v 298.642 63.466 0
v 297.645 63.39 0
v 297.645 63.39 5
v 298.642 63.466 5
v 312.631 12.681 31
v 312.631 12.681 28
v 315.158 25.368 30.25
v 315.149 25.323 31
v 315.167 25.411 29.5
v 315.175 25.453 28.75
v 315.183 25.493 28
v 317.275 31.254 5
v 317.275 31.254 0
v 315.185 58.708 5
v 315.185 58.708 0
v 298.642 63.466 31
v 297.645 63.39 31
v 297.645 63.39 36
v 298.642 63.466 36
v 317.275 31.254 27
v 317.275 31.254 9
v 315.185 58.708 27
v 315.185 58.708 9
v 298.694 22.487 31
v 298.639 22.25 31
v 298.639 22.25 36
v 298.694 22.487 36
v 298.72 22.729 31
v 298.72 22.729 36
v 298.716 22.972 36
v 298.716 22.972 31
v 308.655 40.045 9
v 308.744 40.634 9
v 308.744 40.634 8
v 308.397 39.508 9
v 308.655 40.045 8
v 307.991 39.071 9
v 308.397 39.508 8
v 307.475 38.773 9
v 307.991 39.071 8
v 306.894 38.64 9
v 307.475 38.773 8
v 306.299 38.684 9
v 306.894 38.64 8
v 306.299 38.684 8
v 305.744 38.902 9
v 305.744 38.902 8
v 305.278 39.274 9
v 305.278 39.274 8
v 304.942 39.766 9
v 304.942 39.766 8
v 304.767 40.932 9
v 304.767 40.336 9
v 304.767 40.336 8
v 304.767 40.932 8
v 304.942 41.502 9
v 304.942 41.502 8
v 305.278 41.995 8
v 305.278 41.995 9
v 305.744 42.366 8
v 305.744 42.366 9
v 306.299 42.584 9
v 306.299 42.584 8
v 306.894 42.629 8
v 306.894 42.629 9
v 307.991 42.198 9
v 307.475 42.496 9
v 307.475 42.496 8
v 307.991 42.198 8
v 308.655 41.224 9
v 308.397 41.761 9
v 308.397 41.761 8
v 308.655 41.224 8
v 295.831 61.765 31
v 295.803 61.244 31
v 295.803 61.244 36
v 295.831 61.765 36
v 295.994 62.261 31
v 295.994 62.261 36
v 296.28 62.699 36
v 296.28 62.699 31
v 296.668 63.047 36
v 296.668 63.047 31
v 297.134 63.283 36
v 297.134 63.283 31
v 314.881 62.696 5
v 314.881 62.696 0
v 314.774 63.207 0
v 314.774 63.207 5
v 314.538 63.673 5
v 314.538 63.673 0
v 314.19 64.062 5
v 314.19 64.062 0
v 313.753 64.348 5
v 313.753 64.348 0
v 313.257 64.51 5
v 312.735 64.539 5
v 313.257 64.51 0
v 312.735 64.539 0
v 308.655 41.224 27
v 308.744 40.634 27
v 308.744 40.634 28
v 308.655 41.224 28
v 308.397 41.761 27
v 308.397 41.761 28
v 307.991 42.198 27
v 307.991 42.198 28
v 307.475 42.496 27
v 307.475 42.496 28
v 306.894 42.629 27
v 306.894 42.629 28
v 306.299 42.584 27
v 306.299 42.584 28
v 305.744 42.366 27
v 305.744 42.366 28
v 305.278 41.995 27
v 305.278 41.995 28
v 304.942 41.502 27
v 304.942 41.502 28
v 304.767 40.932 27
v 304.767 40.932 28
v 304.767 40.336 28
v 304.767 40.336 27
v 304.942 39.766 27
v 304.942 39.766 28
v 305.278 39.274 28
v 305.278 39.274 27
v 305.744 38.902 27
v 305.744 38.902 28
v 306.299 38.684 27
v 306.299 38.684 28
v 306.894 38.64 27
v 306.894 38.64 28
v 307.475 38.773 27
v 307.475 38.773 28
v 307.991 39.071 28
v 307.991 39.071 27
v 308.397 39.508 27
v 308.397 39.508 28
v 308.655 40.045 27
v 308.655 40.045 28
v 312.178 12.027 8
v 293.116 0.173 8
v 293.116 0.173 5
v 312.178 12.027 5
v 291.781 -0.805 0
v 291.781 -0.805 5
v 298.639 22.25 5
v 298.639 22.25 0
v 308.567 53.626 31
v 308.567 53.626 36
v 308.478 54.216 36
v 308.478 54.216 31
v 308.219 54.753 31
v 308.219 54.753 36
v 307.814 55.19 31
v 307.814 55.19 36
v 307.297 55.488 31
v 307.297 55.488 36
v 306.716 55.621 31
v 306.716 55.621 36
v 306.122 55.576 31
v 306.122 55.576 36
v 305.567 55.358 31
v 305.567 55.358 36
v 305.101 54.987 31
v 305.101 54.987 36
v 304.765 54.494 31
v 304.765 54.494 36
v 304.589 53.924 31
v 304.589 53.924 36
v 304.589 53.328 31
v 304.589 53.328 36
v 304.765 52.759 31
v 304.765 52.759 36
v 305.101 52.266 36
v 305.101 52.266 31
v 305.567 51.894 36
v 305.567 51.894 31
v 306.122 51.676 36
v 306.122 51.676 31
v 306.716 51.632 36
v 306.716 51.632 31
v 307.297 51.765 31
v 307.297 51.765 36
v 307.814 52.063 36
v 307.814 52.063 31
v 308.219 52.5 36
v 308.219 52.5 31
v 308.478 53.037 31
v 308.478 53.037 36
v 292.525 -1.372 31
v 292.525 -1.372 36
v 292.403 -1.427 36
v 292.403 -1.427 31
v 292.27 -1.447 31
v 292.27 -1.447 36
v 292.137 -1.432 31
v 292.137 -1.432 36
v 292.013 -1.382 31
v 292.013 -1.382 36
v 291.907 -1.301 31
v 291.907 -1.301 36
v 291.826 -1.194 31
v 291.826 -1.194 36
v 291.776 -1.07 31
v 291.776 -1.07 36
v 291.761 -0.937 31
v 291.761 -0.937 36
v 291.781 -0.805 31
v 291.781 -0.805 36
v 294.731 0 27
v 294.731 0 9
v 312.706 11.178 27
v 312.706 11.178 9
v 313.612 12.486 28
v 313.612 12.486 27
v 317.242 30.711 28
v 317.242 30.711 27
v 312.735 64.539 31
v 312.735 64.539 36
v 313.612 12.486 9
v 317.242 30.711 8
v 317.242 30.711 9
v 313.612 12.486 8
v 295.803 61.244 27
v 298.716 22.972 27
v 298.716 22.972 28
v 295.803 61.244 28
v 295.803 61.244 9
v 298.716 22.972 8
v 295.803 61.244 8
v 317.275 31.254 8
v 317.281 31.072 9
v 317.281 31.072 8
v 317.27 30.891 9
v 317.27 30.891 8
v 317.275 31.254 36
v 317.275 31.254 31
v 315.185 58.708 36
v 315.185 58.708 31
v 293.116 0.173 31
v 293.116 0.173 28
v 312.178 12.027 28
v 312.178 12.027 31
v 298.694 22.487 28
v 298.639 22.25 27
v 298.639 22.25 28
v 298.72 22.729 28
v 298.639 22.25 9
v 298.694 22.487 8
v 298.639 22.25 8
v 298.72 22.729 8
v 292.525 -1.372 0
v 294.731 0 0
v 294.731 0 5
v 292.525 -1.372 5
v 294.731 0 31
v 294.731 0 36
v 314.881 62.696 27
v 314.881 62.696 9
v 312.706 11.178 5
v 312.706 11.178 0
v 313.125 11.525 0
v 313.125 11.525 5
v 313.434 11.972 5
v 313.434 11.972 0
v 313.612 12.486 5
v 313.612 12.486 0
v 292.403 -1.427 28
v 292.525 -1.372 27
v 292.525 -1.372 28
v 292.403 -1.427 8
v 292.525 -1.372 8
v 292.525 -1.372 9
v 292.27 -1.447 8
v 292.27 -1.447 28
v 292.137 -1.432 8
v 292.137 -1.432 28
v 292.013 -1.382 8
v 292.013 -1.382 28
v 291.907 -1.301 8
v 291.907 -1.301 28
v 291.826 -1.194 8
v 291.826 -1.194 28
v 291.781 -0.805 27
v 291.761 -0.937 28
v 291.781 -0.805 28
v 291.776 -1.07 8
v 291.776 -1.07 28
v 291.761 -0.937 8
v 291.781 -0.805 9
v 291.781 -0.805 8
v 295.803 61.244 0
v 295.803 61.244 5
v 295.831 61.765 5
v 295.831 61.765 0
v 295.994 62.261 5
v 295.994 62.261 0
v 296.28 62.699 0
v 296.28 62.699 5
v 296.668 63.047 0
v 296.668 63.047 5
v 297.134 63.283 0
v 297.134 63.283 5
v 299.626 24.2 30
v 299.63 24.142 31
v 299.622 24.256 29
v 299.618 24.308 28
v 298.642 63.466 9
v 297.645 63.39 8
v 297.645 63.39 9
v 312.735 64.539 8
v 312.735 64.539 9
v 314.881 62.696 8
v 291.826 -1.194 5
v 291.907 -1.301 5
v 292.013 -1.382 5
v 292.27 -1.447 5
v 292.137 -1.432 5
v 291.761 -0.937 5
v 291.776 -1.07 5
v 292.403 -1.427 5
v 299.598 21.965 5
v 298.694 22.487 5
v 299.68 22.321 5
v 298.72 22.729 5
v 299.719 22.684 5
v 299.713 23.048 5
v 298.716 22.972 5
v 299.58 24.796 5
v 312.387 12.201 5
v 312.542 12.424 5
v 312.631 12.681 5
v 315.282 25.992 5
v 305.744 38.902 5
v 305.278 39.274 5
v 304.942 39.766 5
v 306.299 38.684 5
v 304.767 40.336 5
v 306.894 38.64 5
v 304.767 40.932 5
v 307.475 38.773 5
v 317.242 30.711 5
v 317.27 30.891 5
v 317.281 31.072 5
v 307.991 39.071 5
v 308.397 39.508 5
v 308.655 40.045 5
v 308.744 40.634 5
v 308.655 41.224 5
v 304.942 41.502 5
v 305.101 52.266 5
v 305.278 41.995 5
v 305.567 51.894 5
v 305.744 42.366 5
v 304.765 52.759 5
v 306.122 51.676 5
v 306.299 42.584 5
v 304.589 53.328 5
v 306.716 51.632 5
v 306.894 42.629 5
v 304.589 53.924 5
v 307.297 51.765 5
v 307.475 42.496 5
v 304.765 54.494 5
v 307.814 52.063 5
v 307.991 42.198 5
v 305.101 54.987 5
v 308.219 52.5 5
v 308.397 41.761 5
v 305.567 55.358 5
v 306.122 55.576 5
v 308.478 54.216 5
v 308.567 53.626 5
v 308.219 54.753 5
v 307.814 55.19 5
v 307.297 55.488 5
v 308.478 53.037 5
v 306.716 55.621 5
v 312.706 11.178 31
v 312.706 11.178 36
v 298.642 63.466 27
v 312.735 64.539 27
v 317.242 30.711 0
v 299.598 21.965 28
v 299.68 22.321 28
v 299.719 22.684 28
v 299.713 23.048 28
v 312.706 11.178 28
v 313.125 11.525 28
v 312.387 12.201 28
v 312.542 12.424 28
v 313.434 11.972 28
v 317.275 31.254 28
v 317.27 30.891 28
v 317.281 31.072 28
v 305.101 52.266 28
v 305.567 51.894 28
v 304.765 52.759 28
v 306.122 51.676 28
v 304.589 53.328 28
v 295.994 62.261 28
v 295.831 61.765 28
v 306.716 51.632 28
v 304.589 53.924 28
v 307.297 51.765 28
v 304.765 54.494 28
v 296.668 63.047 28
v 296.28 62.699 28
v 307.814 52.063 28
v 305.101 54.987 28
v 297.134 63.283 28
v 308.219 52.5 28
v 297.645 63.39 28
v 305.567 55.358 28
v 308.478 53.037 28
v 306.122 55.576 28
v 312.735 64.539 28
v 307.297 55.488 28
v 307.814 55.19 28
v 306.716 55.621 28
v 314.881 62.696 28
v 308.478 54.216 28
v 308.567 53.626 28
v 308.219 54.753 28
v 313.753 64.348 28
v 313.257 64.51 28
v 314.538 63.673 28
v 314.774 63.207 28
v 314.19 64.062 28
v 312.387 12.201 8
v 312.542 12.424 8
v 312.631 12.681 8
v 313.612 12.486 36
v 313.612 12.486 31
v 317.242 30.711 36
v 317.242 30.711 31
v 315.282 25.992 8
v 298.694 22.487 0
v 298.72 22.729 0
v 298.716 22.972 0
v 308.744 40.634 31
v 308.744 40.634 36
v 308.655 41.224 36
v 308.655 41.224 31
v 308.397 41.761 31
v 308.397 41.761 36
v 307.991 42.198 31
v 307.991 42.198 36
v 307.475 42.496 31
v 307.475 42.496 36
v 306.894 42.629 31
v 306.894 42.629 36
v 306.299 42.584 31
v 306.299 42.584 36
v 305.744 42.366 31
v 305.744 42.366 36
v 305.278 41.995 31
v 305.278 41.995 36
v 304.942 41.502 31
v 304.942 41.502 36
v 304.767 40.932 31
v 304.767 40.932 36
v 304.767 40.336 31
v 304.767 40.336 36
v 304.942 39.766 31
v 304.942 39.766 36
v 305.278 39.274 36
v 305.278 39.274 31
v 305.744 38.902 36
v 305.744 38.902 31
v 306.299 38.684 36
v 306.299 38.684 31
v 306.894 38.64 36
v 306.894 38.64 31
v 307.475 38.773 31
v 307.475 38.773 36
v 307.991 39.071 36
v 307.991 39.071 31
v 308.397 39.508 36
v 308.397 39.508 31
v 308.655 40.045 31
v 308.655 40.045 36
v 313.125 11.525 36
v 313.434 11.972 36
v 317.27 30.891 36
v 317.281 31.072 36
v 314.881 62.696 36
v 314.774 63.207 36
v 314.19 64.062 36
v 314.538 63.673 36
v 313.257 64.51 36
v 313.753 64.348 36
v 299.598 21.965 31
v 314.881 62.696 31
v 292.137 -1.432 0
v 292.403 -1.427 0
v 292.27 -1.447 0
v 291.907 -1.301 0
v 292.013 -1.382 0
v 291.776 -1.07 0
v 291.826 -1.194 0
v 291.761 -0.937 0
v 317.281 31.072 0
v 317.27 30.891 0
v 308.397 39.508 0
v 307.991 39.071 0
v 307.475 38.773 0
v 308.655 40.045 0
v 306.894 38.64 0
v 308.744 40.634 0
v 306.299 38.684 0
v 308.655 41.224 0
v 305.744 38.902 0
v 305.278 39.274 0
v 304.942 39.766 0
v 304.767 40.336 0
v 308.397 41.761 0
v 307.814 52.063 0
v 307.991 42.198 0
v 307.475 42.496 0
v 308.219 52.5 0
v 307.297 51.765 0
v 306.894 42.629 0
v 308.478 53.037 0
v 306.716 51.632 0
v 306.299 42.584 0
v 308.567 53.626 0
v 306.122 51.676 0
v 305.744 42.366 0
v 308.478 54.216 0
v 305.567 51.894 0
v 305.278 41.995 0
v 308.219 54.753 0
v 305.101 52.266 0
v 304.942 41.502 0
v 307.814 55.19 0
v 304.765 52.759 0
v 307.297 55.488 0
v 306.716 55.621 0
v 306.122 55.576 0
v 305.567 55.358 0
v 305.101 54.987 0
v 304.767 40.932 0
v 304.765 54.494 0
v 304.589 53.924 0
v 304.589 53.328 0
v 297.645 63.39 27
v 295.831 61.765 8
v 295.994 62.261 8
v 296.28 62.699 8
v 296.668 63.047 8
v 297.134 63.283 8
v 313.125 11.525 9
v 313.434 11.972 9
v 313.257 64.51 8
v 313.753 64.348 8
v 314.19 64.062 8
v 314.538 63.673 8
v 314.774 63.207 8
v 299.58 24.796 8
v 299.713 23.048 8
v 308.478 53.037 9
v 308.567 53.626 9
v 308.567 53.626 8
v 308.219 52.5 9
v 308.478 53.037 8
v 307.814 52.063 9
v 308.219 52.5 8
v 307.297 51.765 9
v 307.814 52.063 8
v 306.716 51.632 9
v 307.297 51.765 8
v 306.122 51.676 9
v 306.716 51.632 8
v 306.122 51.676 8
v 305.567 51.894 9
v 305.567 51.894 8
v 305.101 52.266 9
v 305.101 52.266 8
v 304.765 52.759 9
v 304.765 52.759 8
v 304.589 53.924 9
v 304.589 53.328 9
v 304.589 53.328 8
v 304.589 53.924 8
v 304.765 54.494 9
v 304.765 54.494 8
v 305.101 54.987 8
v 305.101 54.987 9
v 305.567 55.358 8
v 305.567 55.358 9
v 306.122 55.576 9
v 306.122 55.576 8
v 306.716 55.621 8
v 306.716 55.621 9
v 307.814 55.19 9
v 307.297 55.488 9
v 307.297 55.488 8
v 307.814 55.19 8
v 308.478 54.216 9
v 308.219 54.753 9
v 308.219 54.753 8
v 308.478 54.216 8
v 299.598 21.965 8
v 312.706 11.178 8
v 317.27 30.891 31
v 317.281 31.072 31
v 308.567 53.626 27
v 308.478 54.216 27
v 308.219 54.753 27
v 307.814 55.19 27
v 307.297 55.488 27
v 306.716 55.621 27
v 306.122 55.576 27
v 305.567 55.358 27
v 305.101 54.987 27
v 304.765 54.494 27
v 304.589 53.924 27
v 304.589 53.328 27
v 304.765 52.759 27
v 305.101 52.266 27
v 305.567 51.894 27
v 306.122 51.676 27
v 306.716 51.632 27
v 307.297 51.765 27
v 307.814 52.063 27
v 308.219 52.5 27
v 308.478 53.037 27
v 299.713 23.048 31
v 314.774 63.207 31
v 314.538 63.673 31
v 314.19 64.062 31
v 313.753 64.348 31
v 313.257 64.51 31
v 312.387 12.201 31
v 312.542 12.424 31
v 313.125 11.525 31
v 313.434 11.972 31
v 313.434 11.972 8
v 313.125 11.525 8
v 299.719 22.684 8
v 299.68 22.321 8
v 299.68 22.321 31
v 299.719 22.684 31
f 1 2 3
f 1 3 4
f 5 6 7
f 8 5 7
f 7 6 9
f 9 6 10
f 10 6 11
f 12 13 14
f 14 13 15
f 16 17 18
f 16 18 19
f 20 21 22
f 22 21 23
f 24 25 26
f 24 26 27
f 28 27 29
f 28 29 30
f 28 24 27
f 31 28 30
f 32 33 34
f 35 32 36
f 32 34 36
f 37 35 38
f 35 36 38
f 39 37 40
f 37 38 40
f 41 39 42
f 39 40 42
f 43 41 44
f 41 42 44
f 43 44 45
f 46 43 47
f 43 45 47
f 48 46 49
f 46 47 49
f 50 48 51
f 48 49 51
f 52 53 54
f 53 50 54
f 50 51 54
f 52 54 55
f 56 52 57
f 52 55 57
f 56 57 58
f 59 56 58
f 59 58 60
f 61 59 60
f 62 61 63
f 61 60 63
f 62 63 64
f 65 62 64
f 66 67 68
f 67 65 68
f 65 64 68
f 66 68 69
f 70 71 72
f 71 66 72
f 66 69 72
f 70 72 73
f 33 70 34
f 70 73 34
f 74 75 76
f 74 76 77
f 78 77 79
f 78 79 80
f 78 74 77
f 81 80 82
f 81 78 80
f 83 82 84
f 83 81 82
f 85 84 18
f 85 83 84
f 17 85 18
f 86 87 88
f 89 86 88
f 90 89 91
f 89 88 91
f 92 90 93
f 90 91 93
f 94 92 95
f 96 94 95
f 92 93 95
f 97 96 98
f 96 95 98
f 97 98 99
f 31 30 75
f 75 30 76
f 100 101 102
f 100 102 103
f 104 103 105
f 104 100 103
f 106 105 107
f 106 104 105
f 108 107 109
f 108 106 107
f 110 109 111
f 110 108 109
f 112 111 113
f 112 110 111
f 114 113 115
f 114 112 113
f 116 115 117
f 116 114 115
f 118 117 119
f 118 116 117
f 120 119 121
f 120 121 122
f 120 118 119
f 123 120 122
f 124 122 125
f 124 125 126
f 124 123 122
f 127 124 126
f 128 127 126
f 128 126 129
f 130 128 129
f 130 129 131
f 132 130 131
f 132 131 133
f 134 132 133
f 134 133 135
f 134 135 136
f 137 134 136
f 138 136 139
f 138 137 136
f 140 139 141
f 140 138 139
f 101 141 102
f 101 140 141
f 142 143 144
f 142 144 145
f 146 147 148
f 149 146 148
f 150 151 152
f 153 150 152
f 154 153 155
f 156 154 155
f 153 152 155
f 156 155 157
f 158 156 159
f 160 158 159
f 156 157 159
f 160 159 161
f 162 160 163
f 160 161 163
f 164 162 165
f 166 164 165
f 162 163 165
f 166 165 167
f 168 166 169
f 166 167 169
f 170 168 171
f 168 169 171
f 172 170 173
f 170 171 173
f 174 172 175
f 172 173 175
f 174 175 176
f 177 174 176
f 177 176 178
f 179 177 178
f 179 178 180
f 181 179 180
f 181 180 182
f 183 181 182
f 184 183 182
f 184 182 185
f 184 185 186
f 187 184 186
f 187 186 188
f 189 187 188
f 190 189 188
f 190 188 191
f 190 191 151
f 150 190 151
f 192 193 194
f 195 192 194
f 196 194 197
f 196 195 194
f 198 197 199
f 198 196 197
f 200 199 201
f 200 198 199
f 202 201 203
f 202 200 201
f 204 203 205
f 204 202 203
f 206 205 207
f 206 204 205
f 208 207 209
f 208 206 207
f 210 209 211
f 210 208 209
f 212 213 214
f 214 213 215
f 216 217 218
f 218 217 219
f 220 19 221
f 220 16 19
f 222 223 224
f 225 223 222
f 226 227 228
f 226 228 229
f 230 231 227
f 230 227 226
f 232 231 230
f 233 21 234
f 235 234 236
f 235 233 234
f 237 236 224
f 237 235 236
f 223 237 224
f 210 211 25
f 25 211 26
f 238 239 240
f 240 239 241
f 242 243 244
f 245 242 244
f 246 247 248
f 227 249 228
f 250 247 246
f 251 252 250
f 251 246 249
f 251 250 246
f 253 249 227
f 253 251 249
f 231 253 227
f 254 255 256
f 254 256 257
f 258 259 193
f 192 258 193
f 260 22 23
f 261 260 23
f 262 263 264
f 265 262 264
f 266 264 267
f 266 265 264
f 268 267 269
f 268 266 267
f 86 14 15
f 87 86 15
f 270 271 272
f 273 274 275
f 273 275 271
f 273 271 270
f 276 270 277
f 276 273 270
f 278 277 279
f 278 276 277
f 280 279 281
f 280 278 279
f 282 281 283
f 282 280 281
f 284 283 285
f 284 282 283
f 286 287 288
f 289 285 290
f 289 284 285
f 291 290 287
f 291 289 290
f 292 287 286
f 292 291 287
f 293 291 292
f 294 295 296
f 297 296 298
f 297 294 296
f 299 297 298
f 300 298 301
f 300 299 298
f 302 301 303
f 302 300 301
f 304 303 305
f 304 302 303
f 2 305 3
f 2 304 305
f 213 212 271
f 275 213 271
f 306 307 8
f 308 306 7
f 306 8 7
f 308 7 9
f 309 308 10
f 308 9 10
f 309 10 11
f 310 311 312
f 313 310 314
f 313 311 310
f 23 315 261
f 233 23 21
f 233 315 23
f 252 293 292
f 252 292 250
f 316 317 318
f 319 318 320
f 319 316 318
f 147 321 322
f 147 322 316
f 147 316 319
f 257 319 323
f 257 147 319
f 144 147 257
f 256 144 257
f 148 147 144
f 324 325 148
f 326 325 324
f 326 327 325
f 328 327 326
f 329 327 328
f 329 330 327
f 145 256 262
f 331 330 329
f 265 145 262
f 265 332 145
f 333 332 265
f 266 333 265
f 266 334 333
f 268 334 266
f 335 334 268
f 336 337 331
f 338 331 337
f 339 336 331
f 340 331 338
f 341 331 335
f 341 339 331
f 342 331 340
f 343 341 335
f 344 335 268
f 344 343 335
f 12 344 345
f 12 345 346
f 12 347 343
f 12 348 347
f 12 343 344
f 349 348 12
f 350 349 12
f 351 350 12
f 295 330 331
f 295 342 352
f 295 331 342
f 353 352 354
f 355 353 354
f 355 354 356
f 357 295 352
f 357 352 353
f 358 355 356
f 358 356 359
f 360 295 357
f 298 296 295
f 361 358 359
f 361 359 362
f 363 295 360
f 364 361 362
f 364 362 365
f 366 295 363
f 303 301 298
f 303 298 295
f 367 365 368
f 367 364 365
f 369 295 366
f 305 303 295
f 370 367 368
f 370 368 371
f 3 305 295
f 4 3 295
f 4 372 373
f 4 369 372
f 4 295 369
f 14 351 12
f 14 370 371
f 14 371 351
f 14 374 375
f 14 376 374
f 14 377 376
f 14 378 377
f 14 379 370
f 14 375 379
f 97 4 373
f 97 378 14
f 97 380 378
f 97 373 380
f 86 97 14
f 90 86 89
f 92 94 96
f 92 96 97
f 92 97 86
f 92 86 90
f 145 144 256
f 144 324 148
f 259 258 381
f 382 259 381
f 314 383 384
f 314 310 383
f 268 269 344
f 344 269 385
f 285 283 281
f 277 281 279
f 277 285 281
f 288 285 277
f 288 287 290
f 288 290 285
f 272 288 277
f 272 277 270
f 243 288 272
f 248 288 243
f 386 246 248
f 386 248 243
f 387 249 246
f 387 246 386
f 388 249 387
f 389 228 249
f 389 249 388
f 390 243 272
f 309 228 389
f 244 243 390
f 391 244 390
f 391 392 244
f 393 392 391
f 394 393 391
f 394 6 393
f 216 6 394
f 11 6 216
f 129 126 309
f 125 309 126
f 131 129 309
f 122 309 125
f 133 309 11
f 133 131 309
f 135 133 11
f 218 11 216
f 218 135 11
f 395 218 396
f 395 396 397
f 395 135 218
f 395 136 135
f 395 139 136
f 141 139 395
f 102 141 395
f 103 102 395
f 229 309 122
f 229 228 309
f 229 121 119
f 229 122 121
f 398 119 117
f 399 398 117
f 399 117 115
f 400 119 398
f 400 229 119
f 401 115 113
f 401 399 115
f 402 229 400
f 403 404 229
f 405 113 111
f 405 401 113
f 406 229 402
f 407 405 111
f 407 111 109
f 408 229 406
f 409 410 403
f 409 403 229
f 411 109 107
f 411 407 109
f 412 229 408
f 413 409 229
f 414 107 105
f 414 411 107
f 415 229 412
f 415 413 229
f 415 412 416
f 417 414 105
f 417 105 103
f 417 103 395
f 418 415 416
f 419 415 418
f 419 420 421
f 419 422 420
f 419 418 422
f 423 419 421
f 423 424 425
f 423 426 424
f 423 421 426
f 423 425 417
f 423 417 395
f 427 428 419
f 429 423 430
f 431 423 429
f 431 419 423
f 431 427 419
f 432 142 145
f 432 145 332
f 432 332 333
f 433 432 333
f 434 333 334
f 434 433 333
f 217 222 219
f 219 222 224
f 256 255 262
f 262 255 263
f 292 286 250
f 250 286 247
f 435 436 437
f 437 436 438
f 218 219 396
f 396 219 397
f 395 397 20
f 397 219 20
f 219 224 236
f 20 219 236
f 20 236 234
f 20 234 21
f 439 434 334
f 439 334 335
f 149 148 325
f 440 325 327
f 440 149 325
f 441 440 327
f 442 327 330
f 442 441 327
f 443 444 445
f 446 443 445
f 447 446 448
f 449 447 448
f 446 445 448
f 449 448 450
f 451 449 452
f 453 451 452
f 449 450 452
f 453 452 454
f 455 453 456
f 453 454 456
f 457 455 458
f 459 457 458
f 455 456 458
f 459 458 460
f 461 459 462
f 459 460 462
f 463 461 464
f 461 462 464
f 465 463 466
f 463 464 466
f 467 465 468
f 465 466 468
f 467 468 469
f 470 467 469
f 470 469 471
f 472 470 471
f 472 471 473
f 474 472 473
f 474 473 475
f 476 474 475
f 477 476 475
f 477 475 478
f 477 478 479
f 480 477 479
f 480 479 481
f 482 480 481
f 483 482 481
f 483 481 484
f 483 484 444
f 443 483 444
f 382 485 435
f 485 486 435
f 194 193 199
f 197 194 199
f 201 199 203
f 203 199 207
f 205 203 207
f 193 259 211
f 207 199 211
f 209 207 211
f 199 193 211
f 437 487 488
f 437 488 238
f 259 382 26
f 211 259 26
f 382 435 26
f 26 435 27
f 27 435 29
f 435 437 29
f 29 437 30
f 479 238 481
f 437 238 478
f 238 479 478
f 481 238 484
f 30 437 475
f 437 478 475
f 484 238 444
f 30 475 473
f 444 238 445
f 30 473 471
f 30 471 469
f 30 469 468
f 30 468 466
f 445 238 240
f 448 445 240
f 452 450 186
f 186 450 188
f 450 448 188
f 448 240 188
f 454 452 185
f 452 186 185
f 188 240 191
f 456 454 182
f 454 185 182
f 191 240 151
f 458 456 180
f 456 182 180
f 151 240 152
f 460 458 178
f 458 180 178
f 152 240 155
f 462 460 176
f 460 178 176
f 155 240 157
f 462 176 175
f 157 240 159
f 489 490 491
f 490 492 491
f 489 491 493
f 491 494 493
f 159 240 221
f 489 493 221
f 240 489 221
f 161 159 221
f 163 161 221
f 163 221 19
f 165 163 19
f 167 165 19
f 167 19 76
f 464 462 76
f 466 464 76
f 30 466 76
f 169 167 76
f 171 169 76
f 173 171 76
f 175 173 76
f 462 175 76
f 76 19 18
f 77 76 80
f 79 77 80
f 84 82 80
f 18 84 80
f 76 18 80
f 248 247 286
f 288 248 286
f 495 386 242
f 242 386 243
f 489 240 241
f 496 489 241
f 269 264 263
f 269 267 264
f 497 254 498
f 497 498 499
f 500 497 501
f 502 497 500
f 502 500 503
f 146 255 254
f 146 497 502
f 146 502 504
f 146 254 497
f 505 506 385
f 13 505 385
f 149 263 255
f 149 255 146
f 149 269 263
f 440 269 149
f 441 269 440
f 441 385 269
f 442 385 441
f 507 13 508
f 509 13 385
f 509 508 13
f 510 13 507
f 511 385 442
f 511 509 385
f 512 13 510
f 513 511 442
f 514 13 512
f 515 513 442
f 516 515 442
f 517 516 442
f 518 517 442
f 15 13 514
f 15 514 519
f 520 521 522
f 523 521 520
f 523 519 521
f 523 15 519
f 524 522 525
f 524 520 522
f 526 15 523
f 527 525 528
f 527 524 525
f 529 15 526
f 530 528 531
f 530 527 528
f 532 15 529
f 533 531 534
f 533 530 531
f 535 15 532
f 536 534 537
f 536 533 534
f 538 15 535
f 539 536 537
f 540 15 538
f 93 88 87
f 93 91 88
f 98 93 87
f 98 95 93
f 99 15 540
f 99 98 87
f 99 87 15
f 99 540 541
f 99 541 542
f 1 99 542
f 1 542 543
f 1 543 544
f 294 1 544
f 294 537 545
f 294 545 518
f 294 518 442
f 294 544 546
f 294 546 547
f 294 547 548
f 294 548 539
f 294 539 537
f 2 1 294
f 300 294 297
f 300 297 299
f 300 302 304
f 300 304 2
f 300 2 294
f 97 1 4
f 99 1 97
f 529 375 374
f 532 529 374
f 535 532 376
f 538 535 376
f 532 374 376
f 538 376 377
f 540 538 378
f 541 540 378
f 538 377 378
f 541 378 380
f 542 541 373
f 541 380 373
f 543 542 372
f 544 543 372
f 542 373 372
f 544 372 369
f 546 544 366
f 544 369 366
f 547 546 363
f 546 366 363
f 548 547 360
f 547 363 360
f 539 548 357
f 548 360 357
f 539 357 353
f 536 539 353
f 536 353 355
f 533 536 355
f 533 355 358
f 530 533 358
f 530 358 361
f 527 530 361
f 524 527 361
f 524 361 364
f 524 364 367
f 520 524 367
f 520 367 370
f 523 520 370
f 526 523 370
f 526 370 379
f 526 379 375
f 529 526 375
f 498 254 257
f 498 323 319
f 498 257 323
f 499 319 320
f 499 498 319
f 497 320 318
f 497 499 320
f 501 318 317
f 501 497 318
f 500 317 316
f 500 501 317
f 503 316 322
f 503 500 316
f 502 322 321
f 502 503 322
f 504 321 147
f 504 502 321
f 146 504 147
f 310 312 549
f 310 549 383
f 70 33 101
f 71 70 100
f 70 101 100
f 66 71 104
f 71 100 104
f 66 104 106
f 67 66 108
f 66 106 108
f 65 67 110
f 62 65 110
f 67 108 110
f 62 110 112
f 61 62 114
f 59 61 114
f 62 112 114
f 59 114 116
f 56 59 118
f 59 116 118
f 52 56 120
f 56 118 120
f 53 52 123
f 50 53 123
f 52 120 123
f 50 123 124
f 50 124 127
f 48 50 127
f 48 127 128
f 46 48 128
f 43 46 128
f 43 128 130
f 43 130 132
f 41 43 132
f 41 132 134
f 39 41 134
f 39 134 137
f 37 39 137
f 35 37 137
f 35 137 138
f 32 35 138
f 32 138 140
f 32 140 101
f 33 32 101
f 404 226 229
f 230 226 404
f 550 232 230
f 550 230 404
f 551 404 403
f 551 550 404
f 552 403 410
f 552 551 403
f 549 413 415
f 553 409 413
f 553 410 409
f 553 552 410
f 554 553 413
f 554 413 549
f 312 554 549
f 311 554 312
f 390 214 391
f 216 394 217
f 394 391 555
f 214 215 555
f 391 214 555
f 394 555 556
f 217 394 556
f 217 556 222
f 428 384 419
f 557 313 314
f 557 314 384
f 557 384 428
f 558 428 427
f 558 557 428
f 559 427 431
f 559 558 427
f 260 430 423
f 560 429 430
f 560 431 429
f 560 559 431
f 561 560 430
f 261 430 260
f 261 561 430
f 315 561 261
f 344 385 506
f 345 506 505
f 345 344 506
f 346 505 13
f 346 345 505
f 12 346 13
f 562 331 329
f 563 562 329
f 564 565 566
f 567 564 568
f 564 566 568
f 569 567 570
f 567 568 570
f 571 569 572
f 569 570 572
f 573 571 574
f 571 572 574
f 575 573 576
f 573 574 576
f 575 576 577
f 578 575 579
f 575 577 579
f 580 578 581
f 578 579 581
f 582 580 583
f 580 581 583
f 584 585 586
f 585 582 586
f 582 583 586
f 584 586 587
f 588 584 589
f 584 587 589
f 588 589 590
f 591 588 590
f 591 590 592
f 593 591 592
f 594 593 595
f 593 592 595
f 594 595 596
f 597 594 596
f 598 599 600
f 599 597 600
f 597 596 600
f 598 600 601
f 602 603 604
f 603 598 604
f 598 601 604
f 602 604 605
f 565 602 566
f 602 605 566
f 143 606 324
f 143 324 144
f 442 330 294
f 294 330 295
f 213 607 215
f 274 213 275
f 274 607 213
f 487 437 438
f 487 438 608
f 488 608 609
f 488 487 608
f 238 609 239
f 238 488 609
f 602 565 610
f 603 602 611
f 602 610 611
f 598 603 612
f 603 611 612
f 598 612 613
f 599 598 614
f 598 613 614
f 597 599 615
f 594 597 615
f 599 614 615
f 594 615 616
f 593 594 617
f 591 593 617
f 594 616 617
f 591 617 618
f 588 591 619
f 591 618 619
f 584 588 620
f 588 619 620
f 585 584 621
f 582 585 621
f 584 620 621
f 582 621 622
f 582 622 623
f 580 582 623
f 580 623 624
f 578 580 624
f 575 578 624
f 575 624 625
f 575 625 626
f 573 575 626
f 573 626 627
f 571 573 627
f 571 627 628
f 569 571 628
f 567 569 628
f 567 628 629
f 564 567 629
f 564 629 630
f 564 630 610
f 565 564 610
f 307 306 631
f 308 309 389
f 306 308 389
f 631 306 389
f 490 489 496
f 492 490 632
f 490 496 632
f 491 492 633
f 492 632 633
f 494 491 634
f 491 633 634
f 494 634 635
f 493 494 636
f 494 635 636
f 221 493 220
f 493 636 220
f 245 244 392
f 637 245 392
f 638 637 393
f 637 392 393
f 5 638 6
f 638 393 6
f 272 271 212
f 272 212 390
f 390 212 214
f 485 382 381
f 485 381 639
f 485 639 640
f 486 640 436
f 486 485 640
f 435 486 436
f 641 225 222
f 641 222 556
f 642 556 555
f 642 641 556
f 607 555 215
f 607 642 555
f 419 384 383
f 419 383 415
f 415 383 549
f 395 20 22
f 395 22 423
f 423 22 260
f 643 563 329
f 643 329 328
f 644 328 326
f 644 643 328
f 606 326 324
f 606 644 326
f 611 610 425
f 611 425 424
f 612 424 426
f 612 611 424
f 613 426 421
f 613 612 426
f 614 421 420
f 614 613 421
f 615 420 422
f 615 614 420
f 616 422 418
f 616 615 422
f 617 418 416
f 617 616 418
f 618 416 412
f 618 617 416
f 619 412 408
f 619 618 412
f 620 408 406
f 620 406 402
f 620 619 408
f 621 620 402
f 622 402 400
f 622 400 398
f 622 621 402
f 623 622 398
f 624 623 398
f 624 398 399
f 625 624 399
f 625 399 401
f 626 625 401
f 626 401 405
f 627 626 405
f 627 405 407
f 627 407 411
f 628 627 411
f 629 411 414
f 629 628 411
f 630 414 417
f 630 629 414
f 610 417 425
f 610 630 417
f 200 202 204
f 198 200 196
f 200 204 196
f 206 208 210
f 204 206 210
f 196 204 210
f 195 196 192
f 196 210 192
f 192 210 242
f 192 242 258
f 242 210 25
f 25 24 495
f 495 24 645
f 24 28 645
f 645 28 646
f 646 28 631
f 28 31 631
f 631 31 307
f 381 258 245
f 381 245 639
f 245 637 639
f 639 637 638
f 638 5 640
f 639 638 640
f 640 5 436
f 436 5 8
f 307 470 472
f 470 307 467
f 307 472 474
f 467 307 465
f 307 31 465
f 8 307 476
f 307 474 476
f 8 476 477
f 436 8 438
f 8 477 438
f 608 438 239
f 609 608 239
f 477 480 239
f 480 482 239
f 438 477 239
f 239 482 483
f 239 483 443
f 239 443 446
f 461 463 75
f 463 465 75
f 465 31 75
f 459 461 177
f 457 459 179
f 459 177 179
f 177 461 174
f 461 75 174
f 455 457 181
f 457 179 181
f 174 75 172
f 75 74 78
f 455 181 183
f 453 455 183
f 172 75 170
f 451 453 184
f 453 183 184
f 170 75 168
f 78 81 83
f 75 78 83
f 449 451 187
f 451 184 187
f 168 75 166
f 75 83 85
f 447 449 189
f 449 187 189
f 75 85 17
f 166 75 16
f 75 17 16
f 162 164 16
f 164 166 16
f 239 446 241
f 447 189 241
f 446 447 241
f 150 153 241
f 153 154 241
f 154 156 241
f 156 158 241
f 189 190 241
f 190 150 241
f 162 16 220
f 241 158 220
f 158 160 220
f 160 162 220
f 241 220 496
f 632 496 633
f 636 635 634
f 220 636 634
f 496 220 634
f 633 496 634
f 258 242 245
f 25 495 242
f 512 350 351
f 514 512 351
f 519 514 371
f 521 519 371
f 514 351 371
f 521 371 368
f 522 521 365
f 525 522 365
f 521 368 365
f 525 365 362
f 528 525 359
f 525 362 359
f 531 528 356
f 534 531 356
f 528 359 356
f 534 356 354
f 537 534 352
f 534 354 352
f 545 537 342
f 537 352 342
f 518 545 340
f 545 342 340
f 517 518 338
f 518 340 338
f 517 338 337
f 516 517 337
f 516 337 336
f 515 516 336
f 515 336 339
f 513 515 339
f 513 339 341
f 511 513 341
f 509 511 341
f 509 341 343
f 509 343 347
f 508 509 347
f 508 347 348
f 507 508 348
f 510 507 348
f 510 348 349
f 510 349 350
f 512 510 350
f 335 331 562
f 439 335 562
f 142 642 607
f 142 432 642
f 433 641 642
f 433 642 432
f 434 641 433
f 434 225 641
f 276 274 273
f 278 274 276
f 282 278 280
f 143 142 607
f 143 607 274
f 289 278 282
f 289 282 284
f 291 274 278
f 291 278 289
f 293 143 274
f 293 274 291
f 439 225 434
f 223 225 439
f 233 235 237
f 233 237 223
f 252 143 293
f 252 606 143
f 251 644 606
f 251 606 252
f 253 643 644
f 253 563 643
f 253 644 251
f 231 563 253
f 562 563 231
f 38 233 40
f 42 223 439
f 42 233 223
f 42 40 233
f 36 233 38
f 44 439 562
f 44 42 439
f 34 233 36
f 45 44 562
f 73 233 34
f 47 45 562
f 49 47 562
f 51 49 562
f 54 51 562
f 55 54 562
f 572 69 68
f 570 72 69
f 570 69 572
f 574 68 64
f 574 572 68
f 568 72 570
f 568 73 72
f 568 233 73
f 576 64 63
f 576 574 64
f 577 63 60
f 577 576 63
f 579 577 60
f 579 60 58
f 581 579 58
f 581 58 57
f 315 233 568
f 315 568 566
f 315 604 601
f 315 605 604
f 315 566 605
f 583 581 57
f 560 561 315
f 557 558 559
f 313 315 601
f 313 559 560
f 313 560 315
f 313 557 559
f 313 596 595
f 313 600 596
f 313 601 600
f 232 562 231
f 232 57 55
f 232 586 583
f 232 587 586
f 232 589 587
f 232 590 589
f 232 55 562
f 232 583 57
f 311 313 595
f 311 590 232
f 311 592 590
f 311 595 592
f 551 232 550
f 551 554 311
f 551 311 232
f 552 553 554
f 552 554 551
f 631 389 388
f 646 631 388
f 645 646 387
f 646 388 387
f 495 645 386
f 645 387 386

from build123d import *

# Parameters (mm, degrees)
EXTRUDE_1_DEPTH     = 36
SKETCH_2_W          = 16.133790568
SKETCH_2_H          = 36
EXTRUDE_2_DEPTH     = 6
EXTRUDE_3_DEPTH     = 36
FILLET_2_R          = 0.5
FILLET_4_R          = 2
CUT_EXTRUDE_START   = -4
CUT_EXTRUDE_1_DEPTH = 4
CUT_EXTRUDE_2_DEPTH = 60.648936936
CUT_EXTRUDE_4_DEPTH = 60.648936936
SKETCH_10_R         = 2
CUT_EXTRUDE_5_DEPTH = 292.913162357
SKETCH_11_R         = 2
EXTRUDE_6_DEPTH     = 1
EXTRUDE_START       = 1
SKETCH_12_R         = 2
EXTRUDE_7_DEPTH     = 1


with BuildPart() as part:
    # 草图1 → 凸台-拉伸1 (new body)
    with BuildSketch(Plane.XY):
        Polygon((299.097748252, 57.483280844), (301.735697168, 22.832042919), (294.730758259, 0), (313.442305989, 11.635922746), (317.295860503, 30.980257384), (315.184988901, 58.707979342), align=None)
    extrude(amount=EXTRUDE_1_DEPTH)

    # 草图2 → 凸台-拉伸2 (add)
    with BuildSketch(Plane(origin=(-2.627453617, 34.513375093, 0), x_dir=(0.9971147561793038, 0.07590891258269725, 0), z_dir=(-0.07590891258269725, 0.9971147561793038, 0))):
        with Locations((310.665166947, -18)):
            Rectangle(SKETCH_2_W, SKETCH_2_H)
    extrude(amount=EXTRUDE_2_DEPTH)

    # 草图3 → 凸台-拉伸3 (add)
    with BuildSketch(Plane.XY.offset(36)):
        Polygon((298.642294776, 63.465969381), (301.735697168, 22.832042919), (294.730758259, 0), (291.40566003, -2.067738419), (298.7443529, 22.604316182), (295.650950508, 63.238242643), align=None)
    extrude(amount=-EXTRUDE_3_DEPTH)

    # 圆角2
    fillet_2_edges = [part.edges().sort_by_distance(p)[0] for p in [
        (291.40566003, -2.067738419, 18),
    ]]
    fillet(fillet_2_edges, radius=FILLET_2_R)

    # 圆角4
    fillet_4_edges = [part.edges().sort_by_distance(p)[0] for p in [
        (317.295860503, 30.980257384, 18),
        (313.442305989, 11.635922746, 18),
        (314.729535426, 64.690667879, 18),
        (298.7443529, 22.604316182, 18),
        (295.650950508, 63.238242643, 18),
    ]]
    fillet(fillet_4_edges, radius=FILLET_4_R)

    # 草图4 → 切除-拉伸1 (cut)
    with BuildSketch(Plane.XY.offset(31).offset(CUT_EXTRUDE_START)):
        with BuildLine():
            Line((292.524622126, -1.371903061), (312.706326829, 11.178248331))
            ThreePointArc((312.706326829, 11.178248331), (313.294550919, 11.738215234), (313.61162859, 12.485899834))
            Line((313.61162859, 12.485899834), (317.242267225, 30.711226207))
            ThreePointArc((317.242267225, 30.711226207), (317.277169716, 30.981386297), (317.27503737, 31.253783271))
            Line((317.27503737, 31.253783271), (314.881353251, 62.696438367))
            ThreePointArc((314.881353251, 62.696438367), (314.189905536, 64.062105166), (312.735305913, 64.538850054))
            Line((312.735305913, 64.538850054), (297.64518002, 63.390060468))
            ThreePointArc((297.64518002, 63.390060468), (296.27951322, 62.698612754), (295.802768333, 61.244013131))
            Line((295.802768333, 61.244013131), (298.716326749, 22.972458573))
            ThreePointArc((298.716326749, 22.972458573), (298.710751525, 22.607910585), (298.639090177, 22.250431957))
            Line((298.639090177, 22.250431957), (291.781334489, -0.804753178))
            ThreePointArc((291.781334489, -0.804753178), (291.957278491, -1.344805743), (292.524622126, -1.371903061))
        make_face()
        with BuildLine():
            Line((312.811214826, 63.541735298), (297.721088933, 62.392945712))
            ThreePointArc((297.721088933, 62.392945712), (297.038255533, 62.047221855), (296.799883089, 61.319922043))
            Line((296.799883089, 61.319922043), (299.713441505, 23.048367486))
            ThreePointArc((299.713441505, 23.048367486), (299.705078669, 22.501545504), (299.597586647, 21.965327561))
            Line((299.597586647, 21.965327561), (293.115505419, 0.173127667))
            Line((293.115505419, 0.173127667), (312.178248026, 12.027443702))
            ThreePointArc((312.178248026, 12.027443702), (312.472360071, 12.307427153), (312.630898906, 12.681269453))
            Line((312.630898906, 12.681269453), (316.261537541, 30.906595826))
            ThreePointArc((316.261537541, 30.906595826), (316.278988787, 31.041675872), (316.277922614, 31.177874358))
            Line((316.277922614, 31.177874358), (313.884238495, 62.620529454))
            ThreePointArc((313.884238495, 62.620529454), (313.538514637, 63.303362854), (312.811214826, 63.541735298))
        make_face(mode=Mode.SUBTRACT)
    cut_extrude_1 = extrude(amount=CUT_EXTRUDE_1_DEPTH, mode=Mode.SUBTRACT)

    # 镜向1: 切除-拉伸1 across plane
    add(cut_extrude_1.mirror(Plane.XY.offset(18)), mode=Mode.SUBTRACT)

    # 草图5 → 切除-拉伸2 (cut, through all)
    with BuildSketch(Plane(origin=(316.815327762, 24.118695337, 0), x_dir=(0, 0, -1), z_dir=(0.9971147561793037, 0.07590891258269838, 0))):
        Polygon((-9, 29.005921915), (-5, 29.005921915), (-5, 7.07960541), (-5, 1.984059182), (-9, 1.984059182), (-9, 7.07960541), align=None)
        with BuildLine():
            Line((-31, 29.005921915), (-31, 7.07960541))
            Line((-31, 7.07960541), (-31, 1.327664424))
            ThreePointArc((-31, 1.327664424), (-29.000294628, 1.441652043), (-27, 1.544783774))
            Line((-27, 1.544783774), (-27, 7.07960541))
            Line((-27, 7.07960541), (-27, 29.005921915))
            Line((-27, 29.005921915), (-31, 29.005921915))
        make_face()
    extrude(amount=-CUT_EXTRUDE_2_DEPTH, mode=Mode.SUBTRACT)

    # 草图9 → 切除-拉伸4 (cut, through all)
    with BuildSketch(Plane(origin=(316.815327762, 24.118695337, 0), x_dir=(0, 0, -1), z_dir=(0.9971147561793037, 0.07590891258269838, 0))):
        Polygon((-9, 38.613242737), (-9, 41.460309821), (-5, 41.460309821), (-5, 38.613242737), (-5, 29.005921915), (-9, 29.005921915), align=None)
        Polygon((-31, 38.613242737), (-31, 44.422842446), (-27, 44.422842446), (-27, 38.613242737), (-27, 29.005921915), (-31, 29.005921915), align=None)
    extrude(amount=-CUT_EXTRUDE_4_DEPTH, mode=Mode.SUBTRACT)

    # 草图10 → 切除-拉伸5 (cut, through all)
    with BuildSketch(Plane(origin=(66.866773871, -81.092277049, 36), x_dir=(0.7883945685937017, 0.6151698986556081, 0), z_dir=(0, 0, 1))):
        with Locations(Location((264.00053068, -51.596816089, 0), (0, 0, 322.035733535))):
            Circle(SKETCH_10_R)
        with Locations(Location((271.852922924, -41.244744086, 0), (0, 0, 322.035733535))):
            Circle(SKETCH_10_R)
    extrude(amount=-CUT_EXTRUDE_5_DEPTH, mode=Mode.SUBTRACT)

    # 草图11 → 凸台-拉伸6 (add)
    with BuildSketch(Plane.XY.offset(27)):
        with BuildLine():
            Line((312.735305913, 64.538850054), (297.64518002, 63.390060468))
            ThreePointArc((297.64518002, 63.390060468), (296.27951322, 62.698612754), (295.802768333, 61.244013131))
            Line((295.802768333, 61.244013131), (298.716326749, 22.972458573))
            ThreePointArc((298.716326749, 22.972458573), (298.710751525, 22.607910585), (298.639090177, 22.250431957))
            Line((298.639090177, 22.250431957), (291.781334489, -0.804753178))
            ThreePointArc((291.781334489, -0.804753178), (291.957278491, -1.344805743), (292.524622126, -1.371903061))
            Line((292.524622126, -1.371903061), (312.706326829, 11.178248331))
            ThreePointArc((312.706326829, 11.178248331), (313.294550919, 11.738215234), (313.61162859, 12.485899834))
            Line((313.61162859, 12.485899834), (317.242267225, 30.711226207))
            ThreePointArc((317.242267225, 30.711226207), (317.277169716, 30.981386297), (317.27503737, 31.253783271))
            Line((317.27503737, 31.253783271), (314.881353251, 62.696438367))
            ThreePointArc((314.881353251, 62.696438367), (314.189905536, 64.062105166), (312.735305913, 64.538850054))
        make_face()
        with Locations((306.74416649, 40.634253093)):
            Circle(SKETCH_11_R, mode=Mode.SUBTRACT)
        with Locations((306.5666668, 53.626325775)):
            Circle(SKETCH_11_R, mode=Mode.SUBTRACT)
    extrude(amount=EXTRUDE_6_DEPTH)

    # 草图12 → 凸台-拉伸7 (add)
    with BuildSketch(Plane(origin=(0, 0, 9), x_dir=(-1, 0, 0), z_dir=(0, 0, -1)).offset(EXTRUDE_START)):
        with BuildLine():
            Line((-298.716326749, 22.972458573), (-295.802768333, 61.244013131))
            ThreePointArc((-295.802768333, 61.244013131), (-296.27951322, 62.698612754), (-297.64518002, 63.390060468))
            Line((-297.64518002, 63.390060468), (-312.735305913, 64.538850054))
            ThreePointArc((-312.735305913, 64.538850054), (-314.189905536, 64.062105166), (-314.881353251, 62.696438367))
            Line((-314.881353251, 62.696438367), (-317.27503737, 31.253783271))
            ThreePointArc((-317.27503737, 31.253783271), (-317.277169716, 30.981386297), (-317.242267225, 30.711226207))
            Line((-317.242267225, 30.711226207), (-313.61162859, 12.485899834))
            ThreePointArc((-313.61162859, 12.485899834), (-313.294550919, 11.738215234), (-312.706326829, 11.178248331))
            Line((-312.706326829, 11.178248331), (-292.524622126, -1.371903061))
            ThreePointArc((-292.524622126, -1.371903061), (-291.957278491, -1.344805743), (-291.781334489, -0.804753178))
            Line((-291.781334489, -0.804753178), (-298.639090177, 22.250431957))
            ThreePointArc((-298.639090177, 22.250431957), (-298.710751525, 22.607910585), (-298.716326749, 22.972458573))
        make_face()
        with Locations(Location((-306.74416649, 40.634253093, 0), (0, 0, 180))):
            Circle(SKETCH_12_R, mode=Mode.SUBTRACT)
        with Locations(Location((-306.5666668, 53.626325775, 0), (0, 0, 180))):
            Circle(SKETCH_12_R, mode=Mode.SUBTRACT)
    extrude(amount=-EXTRUDE_7_DEPTH)


solid = part.part
